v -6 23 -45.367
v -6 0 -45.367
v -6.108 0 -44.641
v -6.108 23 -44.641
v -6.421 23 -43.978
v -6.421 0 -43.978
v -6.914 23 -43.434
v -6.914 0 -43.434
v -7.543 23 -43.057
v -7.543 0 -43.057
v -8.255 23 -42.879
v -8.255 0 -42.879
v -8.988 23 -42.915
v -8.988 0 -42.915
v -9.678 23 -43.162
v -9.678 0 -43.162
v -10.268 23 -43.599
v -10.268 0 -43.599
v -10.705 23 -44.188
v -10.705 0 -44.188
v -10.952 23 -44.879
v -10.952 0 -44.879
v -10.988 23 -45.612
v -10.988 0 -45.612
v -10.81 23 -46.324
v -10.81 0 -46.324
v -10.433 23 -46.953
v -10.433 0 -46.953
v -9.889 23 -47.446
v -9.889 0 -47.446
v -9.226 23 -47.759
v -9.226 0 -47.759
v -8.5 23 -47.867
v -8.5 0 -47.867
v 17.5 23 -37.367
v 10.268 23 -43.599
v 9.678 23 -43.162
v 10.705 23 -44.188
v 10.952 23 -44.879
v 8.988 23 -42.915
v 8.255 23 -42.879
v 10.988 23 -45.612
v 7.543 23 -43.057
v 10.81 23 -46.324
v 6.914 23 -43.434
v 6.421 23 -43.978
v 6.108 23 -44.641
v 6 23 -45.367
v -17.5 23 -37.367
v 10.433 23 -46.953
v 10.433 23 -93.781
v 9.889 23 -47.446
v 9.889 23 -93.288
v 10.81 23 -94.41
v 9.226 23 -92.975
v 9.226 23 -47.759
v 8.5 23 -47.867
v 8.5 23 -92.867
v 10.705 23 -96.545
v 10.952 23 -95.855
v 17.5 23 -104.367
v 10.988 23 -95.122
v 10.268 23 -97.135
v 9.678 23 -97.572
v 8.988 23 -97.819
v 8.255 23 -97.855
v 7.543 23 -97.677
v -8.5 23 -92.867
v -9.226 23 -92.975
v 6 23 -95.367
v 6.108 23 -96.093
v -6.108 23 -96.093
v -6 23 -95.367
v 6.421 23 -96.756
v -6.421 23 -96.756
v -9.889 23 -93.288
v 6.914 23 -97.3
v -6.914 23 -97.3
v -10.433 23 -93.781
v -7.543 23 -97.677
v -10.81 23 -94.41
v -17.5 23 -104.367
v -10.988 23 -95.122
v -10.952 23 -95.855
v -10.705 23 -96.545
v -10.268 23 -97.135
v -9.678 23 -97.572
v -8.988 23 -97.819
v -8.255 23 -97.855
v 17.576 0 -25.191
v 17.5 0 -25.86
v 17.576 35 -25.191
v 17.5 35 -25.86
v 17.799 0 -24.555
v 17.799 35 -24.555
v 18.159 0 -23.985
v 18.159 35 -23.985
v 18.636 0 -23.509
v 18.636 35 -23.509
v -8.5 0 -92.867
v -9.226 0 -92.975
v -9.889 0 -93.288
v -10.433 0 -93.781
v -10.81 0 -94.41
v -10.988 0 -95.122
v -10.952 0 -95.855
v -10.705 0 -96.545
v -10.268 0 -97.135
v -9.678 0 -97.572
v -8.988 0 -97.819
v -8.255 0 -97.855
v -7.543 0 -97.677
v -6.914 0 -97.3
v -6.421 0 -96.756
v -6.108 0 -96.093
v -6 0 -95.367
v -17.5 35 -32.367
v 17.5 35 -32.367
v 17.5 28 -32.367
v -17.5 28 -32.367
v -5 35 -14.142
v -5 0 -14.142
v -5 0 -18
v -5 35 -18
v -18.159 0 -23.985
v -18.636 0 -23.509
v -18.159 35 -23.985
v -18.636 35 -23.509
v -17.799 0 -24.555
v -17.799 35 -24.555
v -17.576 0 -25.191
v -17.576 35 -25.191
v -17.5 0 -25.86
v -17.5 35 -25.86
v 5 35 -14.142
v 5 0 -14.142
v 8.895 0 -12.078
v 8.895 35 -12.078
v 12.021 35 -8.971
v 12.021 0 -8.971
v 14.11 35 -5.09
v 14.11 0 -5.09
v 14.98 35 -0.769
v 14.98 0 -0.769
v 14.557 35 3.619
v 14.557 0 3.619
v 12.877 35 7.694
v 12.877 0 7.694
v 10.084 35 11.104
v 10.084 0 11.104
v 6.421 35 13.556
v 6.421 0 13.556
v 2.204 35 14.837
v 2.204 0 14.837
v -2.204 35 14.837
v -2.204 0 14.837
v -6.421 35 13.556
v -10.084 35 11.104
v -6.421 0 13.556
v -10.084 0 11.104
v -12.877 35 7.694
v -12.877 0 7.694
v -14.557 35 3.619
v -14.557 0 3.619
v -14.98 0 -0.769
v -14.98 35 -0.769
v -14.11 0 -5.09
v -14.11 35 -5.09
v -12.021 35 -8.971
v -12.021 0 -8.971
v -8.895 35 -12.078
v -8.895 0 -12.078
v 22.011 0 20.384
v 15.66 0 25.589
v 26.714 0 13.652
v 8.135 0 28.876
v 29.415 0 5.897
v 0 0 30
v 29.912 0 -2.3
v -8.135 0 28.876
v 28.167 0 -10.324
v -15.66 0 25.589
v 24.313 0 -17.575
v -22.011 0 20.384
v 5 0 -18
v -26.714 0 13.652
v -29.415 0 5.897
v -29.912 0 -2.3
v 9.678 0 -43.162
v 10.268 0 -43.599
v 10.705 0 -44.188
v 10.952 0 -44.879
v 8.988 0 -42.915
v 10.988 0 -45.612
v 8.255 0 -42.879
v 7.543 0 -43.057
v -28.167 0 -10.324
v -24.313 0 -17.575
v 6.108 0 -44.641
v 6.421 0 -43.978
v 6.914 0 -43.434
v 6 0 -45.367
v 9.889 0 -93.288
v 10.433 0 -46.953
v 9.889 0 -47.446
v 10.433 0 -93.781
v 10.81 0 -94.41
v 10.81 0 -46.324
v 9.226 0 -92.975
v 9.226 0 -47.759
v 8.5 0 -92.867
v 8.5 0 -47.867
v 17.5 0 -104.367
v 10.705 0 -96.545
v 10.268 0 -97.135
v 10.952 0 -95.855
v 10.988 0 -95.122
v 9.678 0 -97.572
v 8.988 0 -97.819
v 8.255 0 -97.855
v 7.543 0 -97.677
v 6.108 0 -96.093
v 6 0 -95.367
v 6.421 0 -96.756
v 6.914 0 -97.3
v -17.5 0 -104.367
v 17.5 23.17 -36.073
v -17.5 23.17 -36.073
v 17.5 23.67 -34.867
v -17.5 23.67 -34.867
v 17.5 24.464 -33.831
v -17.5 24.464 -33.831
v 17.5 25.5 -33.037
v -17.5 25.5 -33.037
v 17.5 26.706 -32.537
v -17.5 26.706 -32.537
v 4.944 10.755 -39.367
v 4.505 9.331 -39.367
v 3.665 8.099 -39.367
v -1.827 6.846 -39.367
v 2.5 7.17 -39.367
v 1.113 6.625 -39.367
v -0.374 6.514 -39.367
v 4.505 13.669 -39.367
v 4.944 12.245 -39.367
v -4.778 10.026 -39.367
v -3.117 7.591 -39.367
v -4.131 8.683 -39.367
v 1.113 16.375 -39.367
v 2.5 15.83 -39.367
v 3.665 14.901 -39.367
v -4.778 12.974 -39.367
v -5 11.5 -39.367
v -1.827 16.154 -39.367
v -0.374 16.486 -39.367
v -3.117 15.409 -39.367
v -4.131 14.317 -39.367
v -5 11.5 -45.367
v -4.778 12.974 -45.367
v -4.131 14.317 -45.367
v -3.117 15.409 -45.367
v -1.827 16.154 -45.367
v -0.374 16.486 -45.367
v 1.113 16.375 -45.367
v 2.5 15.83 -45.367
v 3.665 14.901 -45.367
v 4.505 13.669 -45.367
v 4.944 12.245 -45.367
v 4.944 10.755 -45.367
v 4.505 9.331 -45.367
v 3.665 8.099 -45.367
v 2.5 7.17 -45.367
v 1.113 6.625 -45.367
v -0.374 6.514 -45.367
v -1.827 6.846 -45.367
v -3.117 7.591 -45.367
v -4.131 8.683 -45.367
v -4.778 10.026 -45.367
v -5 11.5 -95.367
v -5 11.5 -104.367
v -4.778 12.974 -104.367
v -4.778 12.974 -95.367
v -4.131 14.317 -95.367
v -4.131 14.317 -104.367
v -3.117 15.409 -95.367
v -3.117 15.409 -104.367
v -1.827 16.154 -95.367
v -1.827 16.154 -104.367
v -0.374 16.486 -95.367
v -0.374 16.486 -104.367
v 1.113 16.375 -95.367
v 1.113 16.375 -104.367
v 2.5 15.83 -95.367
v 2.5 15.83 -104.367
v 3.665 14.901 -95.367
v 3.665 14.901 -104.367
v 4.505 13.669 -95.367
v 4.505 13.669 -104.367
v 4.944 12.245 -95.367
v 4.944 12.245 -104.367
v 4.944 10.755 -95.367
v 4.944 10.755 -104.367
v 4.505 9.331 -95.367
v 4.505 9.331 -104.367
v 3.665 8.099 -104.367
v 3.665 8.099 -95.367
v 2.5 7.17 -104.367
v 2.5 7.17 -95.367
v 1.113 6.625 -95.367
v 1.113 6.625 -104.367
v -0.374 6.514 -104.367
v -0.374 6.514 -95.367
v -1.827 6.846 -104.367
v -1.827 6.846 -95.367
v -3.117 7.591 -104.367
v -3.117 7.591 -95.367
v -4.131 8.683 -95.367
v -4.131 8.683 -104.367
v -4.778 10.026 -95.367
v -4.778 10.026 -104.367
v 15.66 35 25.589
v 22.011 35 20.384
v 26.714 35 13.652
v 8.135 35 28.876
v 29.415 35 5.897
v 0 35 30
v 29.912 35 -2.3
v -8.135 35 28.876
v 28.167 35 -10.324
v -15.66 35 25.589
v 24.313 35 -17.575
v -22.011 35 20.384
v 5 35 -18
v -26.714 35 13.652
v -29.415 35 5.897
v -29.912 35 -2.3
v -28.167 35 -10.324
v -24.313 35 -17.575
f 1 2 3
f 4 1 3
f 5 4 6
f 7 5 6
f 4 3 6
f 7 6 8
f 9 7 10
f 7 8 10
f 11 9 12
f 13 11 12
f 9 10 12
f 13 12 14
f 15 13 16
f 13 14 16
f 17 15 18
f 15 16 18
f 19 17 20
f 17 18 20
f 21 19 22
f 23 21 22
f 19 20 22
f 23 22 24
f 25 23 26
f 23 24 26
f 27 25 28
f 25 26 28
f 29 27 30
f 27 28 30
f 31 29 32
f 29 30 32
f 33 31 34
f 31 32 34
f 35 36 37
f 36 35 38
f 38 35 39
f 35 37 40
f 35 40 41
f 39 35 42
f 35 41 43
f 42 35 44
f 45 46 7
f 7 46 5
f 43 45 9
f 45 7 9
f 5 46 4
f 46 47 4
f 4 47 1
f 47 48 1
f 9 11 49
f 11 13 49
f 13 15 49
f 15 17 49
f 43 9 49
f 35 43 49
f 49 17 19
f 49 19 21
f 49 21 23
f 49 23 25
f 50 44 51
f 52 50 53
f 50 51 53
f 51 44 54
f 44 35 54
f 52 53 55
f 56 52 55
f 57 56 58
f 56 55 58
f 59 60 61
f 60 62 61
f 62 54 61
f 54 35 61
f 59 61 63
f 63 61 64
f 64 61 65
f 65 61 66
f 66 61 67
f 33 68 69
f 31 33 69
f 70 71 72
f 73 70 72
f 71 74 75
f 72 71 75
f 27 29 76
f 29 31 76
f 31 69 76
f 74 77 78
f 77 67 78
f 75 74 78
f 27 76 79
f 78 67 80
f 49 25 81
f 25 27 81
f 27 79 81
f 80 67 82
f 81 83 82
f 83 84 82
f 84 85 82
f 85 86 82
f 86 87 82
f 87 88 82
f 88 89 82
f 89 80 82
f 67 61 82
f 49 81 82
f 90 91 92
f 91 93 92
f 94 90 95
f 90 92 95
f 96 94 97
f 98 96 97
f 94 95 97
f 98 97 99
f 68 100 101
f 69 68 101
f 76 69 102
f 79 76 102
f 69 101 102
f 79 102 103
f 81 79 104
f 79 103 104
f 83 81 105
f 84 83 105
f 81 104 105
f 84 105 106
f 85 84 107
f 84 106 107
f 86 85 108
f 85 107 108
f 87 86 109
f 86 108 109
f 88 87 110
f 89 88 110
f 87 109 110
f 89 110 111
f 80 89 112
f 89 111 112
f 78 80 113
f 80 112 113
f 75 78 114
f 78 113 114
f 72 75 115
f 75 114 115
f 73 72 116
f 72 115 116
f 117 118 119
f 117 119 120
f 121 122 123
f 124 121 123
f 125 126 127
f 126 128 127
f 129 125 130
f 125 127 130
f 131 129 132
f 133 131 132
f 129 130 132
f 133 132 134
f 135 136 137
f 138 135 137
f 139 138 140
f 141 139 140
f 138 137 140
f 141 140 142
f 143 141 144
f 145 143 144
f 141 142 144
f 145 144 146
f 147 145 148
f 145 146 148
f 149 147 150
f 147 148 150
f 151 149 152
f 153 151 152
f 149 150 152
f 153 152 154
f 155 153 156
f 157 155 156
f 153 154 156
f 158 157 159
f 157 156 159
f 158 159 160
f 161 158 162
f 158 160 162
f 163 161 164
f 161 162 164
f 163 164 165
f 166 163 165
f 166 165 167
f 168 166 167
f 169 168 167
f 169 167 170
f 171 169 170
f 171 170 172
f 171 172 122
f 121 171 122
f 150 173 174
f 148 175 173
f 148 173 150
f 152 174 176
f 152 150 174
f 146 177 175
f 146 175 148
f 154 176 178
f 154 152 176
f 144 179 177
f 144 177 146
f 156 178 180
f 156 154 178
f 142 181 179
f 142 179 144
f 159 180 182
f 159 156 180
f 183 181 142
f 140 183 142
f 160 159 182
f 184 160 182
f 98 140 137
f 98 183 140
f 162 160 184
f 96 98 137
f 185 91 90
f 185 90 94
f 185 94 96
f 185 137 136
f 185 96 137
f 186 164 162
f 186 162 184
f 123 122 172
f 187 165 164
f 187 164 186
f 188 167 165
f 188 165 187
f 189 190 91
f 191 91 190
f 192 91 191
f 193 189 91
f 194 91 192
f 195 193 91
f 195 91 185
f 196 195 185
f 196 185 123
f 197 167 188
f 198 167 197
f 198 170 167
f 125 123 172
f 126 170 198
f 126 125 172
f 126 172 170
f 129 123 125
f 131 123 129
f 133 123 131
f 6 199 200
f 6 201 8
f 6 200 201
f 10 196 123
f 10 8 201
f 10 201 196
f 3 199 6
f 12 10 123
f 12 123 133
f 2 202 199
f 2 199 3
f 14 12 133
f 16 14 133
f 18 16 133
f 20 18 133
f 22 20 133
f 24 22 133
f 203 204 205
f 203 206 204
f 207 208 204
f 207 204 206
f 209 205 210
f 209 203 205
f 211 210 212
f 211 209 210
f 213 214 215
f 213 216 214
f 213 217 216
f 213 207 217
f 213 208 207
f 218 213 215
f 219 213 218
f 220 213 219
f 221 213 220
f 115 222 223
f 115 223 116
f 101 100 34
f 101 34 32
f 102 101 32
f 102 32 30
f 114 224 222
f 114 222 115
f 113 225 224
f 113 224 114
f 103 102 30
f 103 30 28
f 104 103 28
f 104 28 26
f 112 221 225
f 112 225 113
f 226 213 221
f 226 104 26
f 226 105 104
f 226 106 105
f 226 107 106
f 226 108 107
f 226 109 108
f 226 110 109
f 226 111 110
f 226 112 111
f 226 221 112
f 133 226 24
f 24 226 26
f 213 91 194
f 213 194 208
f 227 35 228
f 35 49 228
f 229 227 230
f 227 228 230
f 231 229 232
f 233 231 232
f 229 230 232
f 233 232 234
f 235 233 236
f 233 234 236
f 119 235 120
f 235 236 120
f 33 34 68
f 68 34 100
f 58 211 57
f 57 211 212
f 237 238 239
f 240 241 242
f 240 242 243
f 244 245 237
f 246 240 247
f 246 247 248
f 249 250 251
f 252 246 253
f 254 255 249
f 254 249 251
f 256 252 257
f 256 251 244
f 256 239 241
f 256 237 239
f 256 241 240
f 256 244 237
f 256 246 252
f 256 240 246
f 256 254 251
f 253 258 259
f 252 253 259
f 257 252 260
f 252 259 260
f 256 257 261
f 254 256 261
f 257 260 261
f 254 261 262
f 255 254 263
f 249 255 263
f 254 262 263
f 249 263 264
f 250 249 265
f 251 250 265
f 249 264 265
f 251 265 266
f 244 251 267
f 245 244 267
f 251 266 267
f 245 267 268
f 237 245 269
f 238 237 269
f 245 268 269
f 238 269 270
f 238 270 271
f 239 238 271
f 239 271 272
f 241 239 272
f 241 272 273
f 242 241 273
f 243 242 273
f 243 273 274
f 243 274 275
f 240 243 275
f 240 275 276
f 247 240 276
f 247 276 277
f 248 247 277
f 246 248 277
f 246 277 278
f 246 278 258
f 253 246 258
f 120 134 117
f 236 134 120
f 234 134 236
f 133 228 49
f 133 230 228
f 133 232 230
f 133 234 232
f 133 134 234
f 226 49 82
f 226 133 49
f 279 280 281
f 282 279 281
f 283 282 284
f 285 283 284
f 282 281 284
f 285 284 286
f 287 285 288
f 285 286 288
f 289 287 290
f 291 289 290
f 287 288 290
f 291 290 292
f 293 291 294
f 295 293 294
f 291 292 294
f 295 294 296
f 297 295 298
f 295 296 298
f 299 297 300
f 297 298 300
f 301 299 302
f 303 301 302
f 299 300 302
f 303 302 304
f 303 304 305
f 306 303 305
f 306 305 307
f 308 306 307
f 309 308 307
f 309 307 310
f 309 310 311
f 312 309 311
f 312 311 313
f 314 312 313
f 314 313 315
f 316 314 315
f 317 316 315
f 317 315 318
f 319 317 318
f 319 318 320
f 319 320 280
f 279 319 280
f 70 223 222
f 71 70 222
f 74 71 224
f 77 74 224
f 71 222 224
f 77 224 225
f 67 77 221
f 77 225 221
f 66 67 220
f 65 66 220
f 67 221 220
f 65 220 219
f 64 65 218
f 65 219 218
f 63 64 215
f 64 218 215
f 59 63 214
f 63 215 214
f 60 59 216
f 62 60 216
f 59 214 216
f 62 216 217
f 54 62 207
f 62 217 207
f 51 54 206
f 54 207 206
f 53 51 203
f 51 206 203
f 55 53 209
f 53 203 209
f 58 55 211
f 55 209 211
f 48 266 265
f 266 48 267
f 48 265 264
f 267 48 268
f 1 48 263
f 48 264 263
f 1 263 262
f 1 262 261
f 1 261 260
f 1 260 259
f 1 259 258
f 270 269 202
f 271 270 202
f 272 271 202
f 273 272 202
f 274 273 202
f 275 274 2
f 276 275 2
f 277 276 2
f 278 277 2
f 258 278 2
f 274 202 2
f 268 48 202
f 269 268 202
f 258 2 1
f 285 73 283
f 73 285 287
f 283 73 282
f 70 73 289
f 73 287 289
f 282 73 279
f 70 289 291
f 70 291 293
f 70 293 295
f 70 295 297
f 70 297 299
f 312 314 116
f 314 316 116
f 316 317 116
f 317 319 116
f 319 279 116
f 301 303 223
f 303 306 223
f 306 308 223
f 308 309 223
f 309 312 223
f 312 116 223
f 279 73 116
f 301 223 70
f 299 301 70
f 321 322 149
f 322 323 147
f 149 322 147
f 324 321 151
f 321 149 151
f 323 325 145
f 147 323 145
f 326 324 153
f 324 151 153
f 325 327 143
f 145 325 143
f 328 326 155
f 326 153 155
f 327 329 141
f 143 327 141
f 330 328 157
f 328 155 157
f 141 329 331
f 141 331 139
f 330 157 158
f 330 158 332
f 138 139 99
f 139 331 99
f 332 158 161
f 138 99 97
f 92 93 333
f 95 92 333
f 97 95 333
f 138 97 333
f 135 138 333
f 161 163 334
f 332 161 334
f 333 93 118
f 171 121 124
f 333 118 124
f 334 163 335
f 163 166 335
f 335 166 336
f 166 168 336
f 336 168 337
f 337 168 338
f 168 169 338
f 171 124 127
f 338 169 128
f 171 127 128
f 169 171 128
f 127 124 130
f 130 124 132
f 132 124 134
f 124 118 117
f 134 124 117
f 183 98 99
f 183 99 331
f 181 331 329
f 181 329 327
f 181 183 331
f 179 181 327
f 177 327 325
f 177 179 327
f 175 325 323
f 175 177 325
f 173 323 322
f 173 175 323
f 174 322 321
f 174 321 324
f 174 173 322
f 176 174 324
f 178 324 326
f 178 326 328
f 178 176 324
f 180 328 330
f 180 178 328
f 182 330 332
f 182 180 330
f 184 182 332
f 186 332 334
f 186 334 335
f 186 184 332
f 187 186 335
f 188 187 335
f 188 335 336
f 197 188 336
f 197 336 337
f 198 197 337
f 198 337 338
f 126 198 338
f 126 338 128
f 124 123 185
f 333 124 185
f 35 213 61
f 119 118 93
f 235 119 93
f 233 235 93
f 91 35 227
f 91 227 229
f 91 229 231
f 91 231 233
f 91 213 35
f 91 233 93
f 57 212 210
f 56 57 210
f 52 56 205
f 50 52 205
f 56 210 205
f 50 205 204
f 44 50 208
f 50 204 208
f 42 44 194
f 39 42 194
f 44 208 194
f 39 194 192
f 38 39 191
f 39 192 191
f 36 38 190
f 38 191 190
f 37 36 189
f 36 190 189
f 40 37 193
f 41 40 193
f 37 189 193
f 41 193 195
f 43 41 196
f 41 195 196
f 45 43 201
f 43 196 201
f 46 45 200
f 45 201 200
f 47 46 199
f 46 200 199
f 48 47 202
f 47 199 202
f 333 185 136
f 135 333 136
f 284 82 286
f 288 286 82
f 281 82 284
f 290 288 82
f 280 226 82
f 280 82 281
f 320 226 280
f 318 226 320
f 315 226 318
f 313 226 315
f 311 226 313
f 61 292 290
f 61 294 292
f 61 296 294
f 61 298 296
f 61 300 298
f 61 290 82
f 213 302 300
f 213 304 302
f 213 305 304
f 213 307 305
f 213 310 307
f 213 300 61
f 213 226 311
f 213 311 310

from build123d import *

# Parameters (mm, degrees)
BOSS_EXTRUDE1_DEPTH = 35
SKETCH2_W           = 35
SKETCH2_H           = 12
CUT_EXTRUDE1_DEPTH  = 72
FILLET1_R           = 5
FILLET2_R           = 3
SKETCH3_R           = 5
CUT_EXTRUDE2_DEPTH  = 65


with BuildPart() as part:
    # Sketch1 → Boss-Extrude1 (new body)
    with BuildSketch(Plane(origin=(0, 0, 0), x_dir=(1, 0, 0), z_dir=(0, 1, 0))):
        with BuildLine():
            Line((-17.5, 104.366985862), (17.5, 104.366985862))
            Line((17.5, 104.366985862), (17.5, 24.366985862))
            ThreePointArc((17.5, 24.366985862), (0, -30), (-17.5, 24.366985862))
            Line((-17.5, 24.366985862), (-17.5, 104.366985862))
        make_face()
        with BuildLine():
            Line((-6, 95.366985862), (6, 95.366985862))
            ThreePointArc((6, 95.366985862), (10.267766953, 97.134752815), (8.5, 92.866985862))
            Line((8.5, 92.866985862), (8.5, 47.866985862))
            ThreePointArc((8.5, 47.866985862), (10.267766953, 43.599218909), (6, 45.366985862))
            Line((6, 45.366985862), (-6, 45.366985862))
            ThreePointArc((-6, 45.366985862), (-10.267766953, 43.599218909), (-8.5, 47.866985862))
            Line((-8.5, 47.866985862), (-8.5, 92.866985862))
            ThreePointArc((-8.5, 92.866985862), (-10.267766953, 97.134752815), (-6, 95.366985862))
        make_face(mode=Mode.SUBTRACT)
        with BuildLine():
            Line((5, 18), (5, 14.142135624))
            ThreePointArc((5, 14.142135624), (0, -15), (-5, 14.142135624))
            Line((-5, 14.142135624), (-5, 18))
            Line((-5, 18), (5, 18))
        make_face(mode=Mode.SUBTRACT)
    extrude(amount=BOSS_EXTRUDE1_DEPTH)

    # Sketch2 → Cut-Extrude1 (cut)
    with BuildSketch(Plane(origin=(0, 0, -104.366985862), x_dir=(-1, 0, 0), z_dir=(0, 0, -1))):
        with Locations((0, 29)):
            Rectangle(SKETCH2_W, SKETCH2_H)
    extrude(amount=-CUT_EXTRUDE1_DEPTH, mode=Mode.SUBTRACT)

    # Fillet1
    fillet1_edges = [part.edges().sort_by_distance(p)[0] for p in [
        (0, 23, -32.366985862),
    ]]
    fillet(fillet1_edges, radius=FILLET1_R)

    # Fillet2
    fillet2_edges = [part.edges().sort_by_distance(p)[0] for p in [
        (-17.5, 17.5, -24.366985862),
        (17.5, 17.5, -24.366985862),
    ]]
    fillet(fillet2_edges, radius=FILLET2_R)

    # Sketch3 → Cut-Extrude2 (cut)
    with BuildSketch(Plane(origin=(0, 0, -104.366985862), x_dir=(-1, 0, 0), z_dir=(0, 0, -1))):
        with Locations((0, 11.5)):
            Circle(SKETCH3_R)
    extrude(amount=-CUT_EXTRUDE2_DEPTH, mode=Mode.SUBTRACT)


solid = part.part
